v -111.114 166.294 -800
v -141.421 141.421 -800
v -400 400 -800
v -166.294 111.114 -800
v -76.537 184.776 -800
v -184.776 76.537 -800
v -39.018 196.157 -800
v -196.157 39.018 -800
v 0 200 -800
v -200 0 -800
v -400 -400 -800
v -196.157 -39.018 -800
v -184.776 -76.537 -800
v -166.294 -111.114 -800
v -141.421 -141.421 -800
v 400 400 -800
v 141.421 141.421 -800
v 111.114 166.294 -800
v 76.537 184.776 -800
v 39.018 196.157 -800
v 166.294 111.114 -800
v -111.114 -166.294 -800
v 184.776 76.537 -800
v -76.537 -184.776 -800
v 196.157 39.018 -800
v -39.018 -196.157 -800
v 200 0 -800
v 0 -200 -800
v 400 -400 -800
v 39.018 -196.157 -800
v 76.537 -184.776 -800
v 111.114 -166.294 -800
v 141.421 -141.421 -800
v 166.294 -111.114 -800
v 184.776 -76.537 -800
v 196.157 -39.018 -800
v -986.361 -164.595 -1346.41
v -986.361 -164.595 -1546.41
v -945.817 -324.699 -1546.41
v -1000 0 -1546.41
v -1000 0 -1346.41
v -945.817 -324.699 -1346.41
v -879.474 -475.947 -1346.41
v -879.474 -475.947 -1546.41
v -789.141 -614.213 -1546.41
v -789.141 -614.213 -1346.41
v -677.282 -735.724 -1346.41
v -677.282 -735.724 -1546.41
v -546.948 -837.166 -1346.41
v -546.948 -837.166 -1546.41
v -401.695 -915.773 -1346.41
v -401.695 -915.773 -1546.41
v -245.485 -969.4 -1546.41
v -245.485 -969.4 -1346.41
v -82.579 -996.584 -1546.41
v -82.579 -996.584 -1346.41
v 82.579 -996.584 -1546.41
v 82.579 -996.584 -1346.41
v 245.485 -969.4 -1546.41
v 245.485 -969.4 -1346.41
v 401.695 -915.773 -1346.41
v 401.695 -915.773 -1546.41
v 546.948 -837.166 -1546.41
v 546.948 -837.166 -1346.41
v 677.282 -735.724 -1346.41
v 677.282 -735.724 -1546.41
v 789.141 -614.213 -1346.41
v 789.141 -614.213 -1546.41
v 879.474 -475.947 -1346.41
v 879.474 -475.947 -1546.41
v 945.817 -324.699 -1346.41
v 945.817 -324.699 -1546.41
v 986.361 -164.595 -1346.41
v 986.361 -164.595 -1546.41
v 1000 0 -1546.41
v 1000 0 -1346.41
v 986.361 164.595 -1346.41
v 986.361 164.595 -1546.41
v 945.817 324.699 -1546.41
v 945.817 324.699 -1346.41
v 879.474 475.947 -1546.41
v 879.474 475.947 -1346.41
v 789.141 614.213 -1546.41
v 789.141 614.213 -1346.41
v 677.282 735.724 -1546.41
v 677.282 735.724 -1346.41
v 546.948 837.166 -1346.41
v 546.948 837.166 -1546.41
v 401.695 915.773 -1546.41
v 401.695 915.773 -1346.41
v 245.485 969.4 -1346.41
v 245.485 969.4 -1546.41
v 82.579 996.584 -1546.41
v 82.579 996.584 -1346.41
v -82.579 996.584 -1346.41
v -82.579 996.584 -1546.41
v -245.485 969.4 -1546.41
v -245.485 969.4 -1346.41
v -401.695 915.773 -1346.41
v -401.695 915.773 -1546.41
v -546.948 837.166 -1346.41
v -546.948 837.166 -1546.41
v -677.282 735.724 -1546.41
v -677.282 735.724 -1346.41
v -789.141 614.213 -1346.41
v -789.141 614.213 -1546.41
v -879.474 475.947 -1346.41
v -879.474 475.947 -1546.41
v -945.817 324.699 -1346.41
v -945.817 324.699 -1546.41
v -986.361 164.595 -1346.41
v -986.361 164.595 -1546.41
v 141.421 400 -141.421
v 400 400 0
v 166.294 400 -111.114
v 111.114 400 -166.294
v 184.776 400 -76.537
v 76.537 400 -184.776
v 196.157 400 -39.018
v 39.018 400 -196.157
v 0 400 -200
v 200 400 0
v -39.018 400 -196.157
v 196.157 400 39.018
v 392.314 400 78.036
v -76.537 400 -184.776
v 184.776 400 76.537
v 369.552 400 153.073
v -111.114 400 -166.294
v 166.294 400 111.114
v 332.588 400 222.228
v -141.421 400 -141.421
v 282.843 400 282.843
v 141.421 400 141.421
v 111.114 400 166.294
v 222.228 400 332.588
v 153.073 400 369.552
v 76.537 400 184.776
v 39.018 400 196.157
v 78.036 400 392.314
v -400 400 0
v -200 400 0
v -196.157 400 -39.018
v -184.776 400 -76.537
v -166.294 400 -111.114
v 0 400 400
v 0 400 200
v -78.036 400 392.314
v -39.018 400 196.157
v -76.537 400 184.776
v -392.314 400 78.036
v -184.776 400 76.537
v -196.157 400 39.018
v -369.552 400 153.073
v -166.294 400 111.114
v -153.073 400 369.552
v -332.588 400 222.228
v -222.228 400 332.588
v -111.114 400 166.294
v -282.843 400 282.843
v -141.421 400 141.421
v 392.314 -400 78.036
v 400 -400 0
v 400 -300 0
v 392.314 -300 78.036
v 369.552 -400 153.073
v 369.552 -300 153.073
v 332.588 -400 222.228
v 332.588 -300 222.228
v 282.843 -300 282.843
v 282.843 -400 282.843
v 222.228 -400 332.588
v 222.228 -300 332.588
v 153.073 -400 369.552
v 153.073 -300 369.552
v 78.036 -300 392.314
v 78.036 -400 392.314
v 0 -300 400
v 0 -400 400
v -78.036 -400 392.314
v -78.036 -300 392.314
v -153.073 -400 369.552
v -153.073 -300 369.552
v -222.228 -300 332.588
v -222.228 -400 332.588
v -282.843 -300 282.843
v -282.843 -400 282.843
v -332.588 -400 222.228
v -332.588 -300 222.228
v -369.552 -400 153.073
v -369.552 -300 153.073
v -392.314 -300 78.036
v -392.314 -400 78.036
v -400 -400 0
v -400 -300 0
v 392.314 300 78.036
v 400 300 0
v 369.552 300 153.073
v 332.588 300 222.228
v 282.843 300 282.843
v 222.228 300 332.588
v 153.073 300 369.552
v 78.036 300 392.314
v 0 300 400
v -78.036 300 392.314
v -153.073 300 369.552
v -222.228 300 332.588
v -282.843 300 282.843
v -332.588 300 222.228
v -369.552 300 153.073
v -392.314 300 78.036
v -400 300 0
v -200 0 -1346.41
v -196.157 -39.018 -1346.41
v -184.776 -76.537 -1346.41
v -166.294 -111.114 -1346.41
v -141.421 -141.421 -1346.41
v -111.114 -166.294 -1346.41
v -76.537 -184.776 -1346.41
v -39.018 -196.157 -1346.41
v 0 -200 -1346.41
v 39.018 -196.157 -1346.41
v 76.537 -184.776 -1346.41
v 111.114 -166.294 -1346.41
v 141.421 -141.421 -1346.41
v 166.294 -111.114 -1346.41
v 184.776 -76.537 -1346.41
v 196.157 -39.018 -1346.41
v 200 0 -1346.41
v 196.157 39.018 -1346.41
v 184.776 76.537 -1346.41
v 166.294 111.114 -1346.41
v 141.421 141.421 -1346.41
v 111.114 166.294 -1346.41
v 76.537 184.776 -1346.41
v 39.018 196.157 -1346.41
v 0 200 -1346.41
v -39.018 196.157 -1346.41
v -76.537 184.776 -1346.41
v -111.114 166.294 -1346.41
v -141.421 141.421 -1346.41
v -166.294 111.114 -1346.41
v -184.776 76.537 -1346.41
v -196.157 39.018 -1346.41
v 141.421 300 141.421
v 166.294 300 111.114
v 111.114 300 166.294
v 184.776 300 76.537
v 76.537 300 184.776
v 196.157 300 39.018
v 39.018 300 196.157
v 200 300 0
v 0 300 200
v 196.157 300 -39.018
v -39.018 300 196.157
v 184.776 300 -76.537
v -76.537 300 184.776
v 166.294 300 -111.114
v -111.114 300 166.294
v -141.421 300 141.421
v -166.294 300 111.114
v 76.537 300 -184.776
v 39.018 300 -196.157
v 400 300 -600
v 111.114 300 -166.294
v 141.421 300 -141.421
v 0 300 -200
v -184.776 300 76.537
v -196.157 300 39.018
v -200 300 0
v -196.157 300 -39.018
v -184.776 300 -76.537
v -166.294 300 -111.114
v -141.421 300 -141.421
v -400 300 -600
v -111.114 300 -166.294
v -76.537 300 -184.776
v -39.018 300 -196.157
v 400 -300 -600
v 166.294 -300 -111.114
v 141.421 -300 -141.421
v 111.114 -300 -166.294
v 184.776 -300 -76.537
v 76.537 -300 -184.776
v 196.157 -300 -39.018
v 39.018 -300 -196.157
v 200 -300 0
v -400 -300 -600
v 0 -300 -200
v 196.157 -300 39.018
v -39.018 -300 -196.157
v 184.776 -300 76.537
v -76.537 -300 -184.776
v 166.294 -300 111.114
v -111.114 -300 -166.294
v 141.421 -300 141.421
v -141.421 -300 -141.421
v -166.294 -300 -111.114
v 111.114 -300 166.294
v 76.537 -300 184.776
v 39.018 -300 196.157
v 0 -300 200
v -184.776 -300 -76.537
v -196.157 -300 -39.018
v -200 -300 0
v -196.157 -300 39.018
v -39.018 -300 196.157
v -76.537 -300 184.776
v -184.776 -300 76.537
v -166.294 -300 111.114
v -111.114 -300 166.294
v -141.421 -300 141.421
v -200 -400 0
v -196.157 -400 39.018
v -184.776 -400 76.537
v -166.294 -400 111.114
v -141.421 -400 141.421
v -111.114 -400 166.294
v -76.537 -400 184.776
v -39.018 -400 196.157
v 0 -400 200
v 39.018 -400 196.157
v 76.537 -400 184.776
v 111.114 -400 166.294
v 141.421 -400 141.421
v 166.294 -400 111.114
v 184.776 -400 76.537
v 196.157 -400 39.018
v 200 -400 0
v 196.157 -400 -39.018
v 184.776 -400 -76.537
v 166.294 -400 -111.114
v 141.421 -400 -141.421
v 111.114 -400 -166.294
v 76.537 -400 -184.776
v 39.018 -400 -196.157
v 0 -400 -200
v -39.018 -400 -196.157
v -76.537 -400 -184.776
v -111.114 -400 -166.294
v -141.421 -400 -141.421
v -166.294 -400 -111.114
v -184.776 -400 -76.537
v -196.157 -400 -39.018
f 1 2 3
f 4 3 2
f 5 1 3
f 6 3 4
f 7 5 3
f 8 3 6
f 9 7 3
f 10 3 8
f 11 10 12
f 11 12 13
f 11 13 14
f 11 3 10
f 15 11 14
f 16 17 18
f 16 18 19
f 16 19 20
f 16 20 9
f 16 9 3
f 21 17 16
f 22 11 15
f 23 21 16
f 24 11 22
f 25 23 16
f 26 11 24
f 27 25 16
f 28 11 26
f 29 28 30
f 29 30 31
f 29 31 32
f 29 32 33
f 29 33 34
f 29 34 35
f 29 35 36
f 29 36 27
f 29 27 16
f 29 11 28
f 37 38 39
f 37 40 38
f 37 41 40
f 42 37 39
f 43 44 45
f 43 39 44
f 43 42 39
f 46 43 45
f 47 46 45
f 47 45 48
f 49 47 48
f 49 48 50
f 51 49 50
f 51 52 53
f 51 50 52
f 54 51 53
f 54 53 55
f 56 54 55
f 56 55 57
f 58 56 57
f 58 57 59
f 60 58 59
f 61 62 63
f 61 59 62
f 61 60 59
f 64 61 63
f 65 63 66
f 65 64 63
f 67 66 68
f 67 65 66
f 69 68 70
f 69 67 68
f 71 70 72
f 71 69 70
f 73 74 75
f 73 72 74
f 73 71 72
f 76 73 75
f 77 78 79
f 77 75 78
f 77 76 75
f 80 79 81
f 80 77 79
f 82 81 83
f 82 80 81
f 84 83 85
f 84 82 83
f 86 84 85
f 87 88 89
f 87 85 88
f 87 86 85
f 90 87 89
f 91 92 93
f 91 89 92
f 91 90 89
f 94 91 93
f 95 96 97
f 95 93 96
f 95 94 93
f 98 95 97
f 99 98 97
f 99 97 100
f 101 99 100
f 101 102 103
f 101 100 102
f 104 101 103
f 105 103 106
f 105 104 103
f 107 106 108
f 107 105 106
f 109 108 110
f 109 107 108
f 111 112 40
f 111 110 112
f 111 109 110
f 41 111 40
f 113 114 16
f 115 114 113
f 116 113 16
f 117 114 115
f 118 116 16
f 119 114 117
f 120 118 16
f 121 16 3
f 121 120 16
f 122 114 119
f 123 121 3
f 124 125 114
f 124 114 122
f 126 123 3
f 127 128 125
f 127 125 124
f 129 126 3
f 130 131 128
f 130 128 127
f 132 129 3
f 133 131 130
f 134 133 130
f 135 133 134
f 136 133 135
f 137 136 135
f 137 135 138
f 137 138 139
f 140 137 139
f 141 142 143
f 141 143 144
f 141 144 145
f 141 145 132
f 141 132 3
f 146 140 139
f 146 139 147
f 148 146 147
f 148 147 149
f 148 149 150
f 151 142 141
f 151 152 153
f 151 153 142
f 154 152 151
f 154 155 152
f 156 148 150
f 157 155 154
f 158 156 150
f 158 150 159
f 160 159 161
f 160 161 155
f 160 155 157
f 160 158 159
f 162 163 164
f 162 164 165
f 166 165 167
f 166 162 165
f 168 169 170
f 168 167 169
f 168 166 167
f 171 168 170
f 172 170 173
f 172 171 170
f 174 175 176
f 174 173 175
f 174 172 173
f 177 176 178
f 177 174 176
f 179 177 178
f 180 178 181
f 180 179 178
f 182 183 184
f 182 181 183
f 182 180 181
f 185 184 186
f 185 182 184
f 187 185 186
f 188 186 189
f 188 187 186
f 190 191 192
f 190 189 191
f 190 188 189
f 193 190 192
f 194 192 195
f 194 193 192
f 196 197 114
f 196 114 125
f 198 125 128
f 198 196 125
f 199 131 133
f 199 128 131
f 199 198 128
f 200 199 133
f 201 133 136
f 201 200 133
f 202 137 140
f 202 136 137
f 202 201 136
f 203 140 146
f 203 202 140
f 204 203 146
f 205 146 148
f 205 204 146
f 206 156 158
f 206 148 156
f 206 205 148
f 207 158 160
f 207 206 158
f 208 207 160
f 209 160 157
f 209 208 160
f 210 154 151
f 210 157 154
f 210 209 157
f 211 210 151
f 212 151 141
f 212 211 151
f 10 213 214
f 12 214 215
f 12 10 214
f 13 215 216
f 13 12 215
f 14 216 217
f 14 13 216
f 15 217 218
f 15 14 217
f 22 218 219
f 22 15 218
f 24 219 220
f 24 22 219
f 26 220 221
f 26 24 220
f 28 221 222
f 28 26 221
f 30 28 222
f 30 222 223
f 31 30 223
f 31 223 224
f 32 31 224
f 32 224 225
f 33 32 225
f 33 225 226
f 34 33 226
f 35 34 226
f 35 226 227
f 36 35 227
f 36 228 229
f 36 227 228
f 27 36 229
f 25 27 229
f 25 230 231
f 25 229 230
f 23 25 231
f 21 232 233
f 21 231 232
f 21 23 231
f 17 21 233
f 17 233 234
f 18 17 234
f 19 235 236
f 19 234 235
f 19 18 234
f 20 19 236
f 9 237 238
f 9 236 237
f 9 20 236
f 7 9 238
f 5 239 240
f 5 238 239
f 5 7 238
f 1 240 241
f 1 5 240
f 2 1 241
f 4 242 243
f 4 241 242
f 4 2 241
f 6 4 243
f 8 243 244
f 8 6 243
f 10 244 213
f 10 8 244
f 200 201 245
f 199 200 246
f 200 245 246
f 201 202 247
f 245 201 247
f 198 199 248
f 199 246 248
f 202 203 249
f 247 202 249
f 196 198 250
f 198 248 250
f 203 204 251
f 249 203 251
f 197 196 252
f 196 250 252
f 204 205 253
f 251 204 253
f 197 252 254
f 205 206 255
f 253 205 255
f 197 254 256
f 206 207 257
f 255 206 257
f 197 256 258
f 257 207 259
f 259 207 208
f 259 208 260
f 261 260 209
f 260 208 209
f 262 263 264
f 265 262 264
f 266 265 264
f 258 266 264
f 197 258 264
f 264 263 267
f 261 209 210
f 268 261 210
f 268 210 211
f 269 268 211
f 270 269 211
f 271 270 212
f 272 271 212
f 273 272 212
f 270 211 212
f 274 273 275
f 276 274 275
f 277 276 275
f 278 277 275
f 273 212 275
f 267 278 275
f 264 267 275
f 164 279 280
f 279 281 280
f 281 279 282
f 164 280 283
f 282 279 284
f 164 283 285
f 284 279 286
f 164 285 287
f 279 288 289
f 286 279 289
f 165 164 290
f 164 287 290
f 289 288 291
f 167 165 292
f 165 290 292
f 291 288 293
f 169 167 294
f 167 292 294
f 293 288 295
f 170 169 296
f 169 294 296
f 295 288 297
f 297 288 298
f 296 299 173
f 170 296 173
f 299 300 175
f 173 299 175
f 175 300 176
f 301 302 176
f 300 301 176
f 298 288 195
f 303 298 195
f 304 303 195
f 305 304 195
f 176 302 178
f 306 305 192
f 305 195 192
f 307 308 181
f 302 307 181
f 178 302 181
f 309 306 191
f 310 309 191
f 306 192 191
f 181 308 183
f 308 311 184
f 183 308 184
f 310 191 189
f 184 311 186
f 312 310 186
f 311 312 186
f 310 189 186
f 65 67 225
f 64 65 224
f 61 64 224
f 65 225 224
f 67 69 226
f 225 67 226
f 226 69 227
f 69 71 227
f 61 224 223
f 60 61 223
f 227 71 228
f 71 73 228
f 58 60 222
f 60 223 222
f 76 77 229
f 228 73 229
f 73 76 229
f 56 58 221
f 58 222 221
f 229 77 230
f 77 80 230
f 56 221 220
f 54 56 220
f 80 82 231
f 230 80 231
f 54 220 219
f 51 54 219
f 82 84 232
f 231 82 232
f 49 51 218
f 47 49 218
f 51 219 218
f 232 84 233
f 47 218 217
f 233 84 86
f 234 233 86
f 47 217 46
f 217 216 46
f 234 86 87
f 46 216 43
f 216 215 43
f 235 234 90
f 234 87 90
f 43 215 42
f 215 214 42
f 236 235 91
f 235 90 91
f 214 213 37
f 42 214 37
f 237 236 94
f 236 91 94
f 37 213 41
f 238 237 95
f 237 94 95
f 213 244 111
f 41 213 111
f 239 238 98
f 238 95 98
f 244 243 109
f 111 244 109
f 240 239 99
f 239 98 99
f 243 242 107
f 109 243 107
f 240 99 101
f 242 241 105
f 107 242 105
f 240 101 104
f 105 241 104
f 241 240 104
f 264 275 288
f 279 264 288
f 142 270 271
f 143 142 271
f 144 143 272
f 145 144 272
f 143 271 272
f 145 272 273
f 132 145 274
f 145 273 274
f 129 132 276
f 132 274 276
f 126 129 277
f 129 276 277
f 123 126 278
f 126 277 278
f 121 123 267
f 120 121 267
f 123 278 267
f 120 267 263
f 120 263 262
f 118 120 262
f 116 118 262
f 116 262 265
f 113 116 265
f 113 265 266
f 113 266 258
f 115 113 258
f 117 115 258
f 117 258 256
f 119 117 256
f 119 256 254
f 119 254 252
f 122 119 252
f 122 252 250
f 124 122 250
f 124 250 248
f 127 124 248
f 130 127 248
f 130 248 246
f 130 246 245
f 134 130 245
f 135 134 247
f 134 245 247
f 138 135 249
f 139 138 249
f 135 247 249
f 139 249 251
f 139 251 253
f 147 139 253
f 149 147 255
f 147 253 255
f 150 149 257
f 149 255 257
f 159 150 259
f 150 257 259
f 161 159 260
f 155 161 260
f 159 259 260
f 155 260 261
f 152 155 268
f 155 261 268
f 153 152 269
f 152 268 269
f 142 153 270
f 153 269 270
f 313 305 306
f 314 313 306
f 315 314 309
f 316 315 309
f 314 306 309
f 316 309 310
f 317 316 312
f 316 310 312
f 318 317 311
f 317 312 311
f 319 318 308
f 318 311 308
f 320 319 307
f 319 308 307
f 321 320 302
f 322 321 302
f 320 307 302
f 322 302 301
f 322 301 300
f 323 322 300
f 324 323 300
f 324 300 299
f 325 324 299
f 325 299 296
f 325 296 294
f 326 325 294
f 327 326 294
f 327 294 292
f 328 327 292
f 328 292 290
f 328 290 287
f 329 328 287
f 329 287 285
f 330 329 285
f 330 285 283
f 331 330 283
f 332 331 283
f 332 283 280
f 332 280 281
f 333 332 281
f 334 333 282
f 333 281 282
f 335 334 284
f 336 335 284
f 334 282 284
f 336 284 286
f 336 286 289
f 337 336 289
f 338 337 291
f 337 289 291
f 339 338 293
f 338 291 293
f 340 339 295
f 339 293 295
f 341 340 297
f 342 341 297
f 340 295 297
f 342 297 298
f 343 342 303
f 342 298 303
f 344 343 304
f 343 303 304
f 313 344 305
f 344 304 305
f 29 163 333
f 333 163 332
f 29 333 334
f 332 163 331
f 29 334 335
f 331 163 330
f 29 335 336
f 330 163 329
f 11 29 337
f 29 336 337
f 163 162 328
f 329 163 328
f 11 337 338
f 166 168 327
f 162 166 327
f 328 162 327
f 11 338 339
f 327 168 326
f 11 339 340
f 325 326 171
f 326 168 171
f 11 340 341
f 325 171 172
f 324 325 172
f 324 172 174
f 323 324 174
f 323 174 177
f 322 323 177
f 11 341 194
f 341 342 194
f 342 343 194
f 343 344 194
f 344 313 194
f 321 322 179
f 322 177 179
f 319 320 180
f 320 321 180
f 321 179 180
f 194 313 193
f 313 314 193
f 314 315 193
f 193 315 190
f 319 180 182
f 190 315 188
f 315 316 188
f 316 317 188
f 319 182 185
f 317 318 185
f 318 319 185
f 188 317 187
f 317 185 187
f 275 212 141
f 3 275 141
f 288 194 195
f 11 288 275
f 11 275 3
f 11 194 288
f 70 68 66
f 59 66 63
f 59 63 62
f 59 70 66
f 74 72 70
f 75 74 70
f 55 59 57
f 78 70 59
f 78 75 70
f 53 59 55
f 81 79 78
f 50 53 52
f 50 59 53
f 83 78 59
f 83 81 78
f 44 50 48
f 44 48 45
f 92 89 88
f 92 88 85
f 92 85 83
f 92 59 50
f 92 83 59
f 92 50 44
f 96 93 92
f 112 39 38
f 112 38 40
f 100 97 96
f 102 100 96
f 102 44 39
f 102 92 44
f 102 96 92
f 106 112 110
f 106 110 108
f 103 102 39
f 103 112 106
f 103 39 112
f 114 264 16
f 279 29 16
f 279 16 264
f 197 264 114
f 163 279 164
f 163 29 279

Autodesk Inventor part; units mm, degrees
ref_plane "YZ Plane" through (0, 0, 0) normal (1, 0, 0) x (0, 1, 0)
ref_plane "XZ Plane" through (0, 0, 0) normal (0, 1, 0) x (-1, 0, 0)
ref_plane "XY Plane" through (0, 0, 0) normal (0, 0, 1) x (1, 0, 0)
sketch "Sketch2" plane through (0, 0, 0) normal (0, 1, 0) x (-1, 0, 0)
  line L0 (0, 143.7774) -> (0, -346.4102) construction
  line L1 (190.8875, 0) -> (-168.3726, 0)
  arc A0 (200, -346.4102) -> (0, 400) centre (0, 0) ccw construction
  line L2 (0, 0) -> (0, -346.4102) construction
  line L3 (0, -1546.4102) -> (1000, -1546.4102)
  line L4 (1000, -1546.4102) -> (1000, -1346.4102)
  line L5 (1000, -1346.4102) -> (200, -1346.4102)
  line L6 (200, -1346.4102) -> (200, -346.4102)
  line L7 (0, 0) -> (0, 400) construction
  line L8 (200, -346.4102) -> (0, -346.4102)
  line L9 (0, -346.4102) -> (0, -95.5661) construction
  line L10 (0, -346.4102) -> (0, -1546.4102)
  dimension "d0" = 400
  dimension "ht" = 1000
  dimension "base_thick" = 200
  dimension "base_radius" = 1000
  dimension "d11" = 200
revolve "Revolution2" add sketch "Sketch2" angle 360 about axis through (0, 0, 143.7774) along (0, 0, -1)
sketch "Sketch3" plane through (0, 0, 0) normal (0, 1, 0) x (-1, 0, 0)
  line L0 (68.3369, 0) -> (-71.9882, 0)
  line L1 (0, 52.8788) -> (0, -69.4874)
  arc A0 (400, 0) -> (-400, 0) centre (0, 0) ccw
  line L2 (400, 0) -> (400, -800)
  line L3 (400, -800) -> (-400, -800)
  line L4 (-400, -800) -> (-400, 0)
  dimension "d26" = 400
  dimension "d27" = 800
extrude "Extrusion1" add sketch "Sketch3" along normal mid plane 800
sketch "Sketch4" plane through (0, 0, 0) normal (0, 1, 0) x (-1, 0, 0)
  circle A0 centre (0, 0) radius 200
  dimension "d30" = 200
extrude "Extrusion2" cut sketch "Sketch4" along normal through all both and the other way through all
sketch "Sketch5" plane through (0, 0, 0) normal (1, 0, 0) x (0, 1, 0)
  line L0 (300, -600) -> (-300, -600)
  line L1 (-300, -600) -> (-300, 400)
  line L2 (-300, 400) -> (300, 400)
  line L3 (300, 400) -> (300, -600)
  line L4 (0, -62.7821) -> (0, 60)
  line L5 (91.6333, 0) -> (-95.5004, 0)
  line L6 (0, -200) -> (0, 150) construction
  point P0 (0, 0)
  dimension "d35" = 300
  dimension "d36" = 400
  dimension "d39" = 600
extrude "Extrusion3" cut sketch "Sketch5" along normal through all both and the other way through all
equation "\"d0\" = S_radius"
equation "\"ht\" = 5 * rod_radius"
equation "\"base_thick\" = rod_radius"
equation "\"base_radius\" = 5 * rod_radius"
equation "\"d11\" = rod_radius"
equation "\"d26\" = S_radius"
equation "\"d27\" = 2 * S_radius"
equation "\"d28\" = 2 * S_radius"
equation "\"d30\" = rod_radius"
equation "\"d35\" = 1.5 * rod_radius"
equation "\"d36\" = S_radius"
equation "\"d39\" = 1.5 * S_radius"
equation "\"rod_radius\" = 200"
equation "\"S_radius\" = 2 * rod_radius"
properties part number "FP"
